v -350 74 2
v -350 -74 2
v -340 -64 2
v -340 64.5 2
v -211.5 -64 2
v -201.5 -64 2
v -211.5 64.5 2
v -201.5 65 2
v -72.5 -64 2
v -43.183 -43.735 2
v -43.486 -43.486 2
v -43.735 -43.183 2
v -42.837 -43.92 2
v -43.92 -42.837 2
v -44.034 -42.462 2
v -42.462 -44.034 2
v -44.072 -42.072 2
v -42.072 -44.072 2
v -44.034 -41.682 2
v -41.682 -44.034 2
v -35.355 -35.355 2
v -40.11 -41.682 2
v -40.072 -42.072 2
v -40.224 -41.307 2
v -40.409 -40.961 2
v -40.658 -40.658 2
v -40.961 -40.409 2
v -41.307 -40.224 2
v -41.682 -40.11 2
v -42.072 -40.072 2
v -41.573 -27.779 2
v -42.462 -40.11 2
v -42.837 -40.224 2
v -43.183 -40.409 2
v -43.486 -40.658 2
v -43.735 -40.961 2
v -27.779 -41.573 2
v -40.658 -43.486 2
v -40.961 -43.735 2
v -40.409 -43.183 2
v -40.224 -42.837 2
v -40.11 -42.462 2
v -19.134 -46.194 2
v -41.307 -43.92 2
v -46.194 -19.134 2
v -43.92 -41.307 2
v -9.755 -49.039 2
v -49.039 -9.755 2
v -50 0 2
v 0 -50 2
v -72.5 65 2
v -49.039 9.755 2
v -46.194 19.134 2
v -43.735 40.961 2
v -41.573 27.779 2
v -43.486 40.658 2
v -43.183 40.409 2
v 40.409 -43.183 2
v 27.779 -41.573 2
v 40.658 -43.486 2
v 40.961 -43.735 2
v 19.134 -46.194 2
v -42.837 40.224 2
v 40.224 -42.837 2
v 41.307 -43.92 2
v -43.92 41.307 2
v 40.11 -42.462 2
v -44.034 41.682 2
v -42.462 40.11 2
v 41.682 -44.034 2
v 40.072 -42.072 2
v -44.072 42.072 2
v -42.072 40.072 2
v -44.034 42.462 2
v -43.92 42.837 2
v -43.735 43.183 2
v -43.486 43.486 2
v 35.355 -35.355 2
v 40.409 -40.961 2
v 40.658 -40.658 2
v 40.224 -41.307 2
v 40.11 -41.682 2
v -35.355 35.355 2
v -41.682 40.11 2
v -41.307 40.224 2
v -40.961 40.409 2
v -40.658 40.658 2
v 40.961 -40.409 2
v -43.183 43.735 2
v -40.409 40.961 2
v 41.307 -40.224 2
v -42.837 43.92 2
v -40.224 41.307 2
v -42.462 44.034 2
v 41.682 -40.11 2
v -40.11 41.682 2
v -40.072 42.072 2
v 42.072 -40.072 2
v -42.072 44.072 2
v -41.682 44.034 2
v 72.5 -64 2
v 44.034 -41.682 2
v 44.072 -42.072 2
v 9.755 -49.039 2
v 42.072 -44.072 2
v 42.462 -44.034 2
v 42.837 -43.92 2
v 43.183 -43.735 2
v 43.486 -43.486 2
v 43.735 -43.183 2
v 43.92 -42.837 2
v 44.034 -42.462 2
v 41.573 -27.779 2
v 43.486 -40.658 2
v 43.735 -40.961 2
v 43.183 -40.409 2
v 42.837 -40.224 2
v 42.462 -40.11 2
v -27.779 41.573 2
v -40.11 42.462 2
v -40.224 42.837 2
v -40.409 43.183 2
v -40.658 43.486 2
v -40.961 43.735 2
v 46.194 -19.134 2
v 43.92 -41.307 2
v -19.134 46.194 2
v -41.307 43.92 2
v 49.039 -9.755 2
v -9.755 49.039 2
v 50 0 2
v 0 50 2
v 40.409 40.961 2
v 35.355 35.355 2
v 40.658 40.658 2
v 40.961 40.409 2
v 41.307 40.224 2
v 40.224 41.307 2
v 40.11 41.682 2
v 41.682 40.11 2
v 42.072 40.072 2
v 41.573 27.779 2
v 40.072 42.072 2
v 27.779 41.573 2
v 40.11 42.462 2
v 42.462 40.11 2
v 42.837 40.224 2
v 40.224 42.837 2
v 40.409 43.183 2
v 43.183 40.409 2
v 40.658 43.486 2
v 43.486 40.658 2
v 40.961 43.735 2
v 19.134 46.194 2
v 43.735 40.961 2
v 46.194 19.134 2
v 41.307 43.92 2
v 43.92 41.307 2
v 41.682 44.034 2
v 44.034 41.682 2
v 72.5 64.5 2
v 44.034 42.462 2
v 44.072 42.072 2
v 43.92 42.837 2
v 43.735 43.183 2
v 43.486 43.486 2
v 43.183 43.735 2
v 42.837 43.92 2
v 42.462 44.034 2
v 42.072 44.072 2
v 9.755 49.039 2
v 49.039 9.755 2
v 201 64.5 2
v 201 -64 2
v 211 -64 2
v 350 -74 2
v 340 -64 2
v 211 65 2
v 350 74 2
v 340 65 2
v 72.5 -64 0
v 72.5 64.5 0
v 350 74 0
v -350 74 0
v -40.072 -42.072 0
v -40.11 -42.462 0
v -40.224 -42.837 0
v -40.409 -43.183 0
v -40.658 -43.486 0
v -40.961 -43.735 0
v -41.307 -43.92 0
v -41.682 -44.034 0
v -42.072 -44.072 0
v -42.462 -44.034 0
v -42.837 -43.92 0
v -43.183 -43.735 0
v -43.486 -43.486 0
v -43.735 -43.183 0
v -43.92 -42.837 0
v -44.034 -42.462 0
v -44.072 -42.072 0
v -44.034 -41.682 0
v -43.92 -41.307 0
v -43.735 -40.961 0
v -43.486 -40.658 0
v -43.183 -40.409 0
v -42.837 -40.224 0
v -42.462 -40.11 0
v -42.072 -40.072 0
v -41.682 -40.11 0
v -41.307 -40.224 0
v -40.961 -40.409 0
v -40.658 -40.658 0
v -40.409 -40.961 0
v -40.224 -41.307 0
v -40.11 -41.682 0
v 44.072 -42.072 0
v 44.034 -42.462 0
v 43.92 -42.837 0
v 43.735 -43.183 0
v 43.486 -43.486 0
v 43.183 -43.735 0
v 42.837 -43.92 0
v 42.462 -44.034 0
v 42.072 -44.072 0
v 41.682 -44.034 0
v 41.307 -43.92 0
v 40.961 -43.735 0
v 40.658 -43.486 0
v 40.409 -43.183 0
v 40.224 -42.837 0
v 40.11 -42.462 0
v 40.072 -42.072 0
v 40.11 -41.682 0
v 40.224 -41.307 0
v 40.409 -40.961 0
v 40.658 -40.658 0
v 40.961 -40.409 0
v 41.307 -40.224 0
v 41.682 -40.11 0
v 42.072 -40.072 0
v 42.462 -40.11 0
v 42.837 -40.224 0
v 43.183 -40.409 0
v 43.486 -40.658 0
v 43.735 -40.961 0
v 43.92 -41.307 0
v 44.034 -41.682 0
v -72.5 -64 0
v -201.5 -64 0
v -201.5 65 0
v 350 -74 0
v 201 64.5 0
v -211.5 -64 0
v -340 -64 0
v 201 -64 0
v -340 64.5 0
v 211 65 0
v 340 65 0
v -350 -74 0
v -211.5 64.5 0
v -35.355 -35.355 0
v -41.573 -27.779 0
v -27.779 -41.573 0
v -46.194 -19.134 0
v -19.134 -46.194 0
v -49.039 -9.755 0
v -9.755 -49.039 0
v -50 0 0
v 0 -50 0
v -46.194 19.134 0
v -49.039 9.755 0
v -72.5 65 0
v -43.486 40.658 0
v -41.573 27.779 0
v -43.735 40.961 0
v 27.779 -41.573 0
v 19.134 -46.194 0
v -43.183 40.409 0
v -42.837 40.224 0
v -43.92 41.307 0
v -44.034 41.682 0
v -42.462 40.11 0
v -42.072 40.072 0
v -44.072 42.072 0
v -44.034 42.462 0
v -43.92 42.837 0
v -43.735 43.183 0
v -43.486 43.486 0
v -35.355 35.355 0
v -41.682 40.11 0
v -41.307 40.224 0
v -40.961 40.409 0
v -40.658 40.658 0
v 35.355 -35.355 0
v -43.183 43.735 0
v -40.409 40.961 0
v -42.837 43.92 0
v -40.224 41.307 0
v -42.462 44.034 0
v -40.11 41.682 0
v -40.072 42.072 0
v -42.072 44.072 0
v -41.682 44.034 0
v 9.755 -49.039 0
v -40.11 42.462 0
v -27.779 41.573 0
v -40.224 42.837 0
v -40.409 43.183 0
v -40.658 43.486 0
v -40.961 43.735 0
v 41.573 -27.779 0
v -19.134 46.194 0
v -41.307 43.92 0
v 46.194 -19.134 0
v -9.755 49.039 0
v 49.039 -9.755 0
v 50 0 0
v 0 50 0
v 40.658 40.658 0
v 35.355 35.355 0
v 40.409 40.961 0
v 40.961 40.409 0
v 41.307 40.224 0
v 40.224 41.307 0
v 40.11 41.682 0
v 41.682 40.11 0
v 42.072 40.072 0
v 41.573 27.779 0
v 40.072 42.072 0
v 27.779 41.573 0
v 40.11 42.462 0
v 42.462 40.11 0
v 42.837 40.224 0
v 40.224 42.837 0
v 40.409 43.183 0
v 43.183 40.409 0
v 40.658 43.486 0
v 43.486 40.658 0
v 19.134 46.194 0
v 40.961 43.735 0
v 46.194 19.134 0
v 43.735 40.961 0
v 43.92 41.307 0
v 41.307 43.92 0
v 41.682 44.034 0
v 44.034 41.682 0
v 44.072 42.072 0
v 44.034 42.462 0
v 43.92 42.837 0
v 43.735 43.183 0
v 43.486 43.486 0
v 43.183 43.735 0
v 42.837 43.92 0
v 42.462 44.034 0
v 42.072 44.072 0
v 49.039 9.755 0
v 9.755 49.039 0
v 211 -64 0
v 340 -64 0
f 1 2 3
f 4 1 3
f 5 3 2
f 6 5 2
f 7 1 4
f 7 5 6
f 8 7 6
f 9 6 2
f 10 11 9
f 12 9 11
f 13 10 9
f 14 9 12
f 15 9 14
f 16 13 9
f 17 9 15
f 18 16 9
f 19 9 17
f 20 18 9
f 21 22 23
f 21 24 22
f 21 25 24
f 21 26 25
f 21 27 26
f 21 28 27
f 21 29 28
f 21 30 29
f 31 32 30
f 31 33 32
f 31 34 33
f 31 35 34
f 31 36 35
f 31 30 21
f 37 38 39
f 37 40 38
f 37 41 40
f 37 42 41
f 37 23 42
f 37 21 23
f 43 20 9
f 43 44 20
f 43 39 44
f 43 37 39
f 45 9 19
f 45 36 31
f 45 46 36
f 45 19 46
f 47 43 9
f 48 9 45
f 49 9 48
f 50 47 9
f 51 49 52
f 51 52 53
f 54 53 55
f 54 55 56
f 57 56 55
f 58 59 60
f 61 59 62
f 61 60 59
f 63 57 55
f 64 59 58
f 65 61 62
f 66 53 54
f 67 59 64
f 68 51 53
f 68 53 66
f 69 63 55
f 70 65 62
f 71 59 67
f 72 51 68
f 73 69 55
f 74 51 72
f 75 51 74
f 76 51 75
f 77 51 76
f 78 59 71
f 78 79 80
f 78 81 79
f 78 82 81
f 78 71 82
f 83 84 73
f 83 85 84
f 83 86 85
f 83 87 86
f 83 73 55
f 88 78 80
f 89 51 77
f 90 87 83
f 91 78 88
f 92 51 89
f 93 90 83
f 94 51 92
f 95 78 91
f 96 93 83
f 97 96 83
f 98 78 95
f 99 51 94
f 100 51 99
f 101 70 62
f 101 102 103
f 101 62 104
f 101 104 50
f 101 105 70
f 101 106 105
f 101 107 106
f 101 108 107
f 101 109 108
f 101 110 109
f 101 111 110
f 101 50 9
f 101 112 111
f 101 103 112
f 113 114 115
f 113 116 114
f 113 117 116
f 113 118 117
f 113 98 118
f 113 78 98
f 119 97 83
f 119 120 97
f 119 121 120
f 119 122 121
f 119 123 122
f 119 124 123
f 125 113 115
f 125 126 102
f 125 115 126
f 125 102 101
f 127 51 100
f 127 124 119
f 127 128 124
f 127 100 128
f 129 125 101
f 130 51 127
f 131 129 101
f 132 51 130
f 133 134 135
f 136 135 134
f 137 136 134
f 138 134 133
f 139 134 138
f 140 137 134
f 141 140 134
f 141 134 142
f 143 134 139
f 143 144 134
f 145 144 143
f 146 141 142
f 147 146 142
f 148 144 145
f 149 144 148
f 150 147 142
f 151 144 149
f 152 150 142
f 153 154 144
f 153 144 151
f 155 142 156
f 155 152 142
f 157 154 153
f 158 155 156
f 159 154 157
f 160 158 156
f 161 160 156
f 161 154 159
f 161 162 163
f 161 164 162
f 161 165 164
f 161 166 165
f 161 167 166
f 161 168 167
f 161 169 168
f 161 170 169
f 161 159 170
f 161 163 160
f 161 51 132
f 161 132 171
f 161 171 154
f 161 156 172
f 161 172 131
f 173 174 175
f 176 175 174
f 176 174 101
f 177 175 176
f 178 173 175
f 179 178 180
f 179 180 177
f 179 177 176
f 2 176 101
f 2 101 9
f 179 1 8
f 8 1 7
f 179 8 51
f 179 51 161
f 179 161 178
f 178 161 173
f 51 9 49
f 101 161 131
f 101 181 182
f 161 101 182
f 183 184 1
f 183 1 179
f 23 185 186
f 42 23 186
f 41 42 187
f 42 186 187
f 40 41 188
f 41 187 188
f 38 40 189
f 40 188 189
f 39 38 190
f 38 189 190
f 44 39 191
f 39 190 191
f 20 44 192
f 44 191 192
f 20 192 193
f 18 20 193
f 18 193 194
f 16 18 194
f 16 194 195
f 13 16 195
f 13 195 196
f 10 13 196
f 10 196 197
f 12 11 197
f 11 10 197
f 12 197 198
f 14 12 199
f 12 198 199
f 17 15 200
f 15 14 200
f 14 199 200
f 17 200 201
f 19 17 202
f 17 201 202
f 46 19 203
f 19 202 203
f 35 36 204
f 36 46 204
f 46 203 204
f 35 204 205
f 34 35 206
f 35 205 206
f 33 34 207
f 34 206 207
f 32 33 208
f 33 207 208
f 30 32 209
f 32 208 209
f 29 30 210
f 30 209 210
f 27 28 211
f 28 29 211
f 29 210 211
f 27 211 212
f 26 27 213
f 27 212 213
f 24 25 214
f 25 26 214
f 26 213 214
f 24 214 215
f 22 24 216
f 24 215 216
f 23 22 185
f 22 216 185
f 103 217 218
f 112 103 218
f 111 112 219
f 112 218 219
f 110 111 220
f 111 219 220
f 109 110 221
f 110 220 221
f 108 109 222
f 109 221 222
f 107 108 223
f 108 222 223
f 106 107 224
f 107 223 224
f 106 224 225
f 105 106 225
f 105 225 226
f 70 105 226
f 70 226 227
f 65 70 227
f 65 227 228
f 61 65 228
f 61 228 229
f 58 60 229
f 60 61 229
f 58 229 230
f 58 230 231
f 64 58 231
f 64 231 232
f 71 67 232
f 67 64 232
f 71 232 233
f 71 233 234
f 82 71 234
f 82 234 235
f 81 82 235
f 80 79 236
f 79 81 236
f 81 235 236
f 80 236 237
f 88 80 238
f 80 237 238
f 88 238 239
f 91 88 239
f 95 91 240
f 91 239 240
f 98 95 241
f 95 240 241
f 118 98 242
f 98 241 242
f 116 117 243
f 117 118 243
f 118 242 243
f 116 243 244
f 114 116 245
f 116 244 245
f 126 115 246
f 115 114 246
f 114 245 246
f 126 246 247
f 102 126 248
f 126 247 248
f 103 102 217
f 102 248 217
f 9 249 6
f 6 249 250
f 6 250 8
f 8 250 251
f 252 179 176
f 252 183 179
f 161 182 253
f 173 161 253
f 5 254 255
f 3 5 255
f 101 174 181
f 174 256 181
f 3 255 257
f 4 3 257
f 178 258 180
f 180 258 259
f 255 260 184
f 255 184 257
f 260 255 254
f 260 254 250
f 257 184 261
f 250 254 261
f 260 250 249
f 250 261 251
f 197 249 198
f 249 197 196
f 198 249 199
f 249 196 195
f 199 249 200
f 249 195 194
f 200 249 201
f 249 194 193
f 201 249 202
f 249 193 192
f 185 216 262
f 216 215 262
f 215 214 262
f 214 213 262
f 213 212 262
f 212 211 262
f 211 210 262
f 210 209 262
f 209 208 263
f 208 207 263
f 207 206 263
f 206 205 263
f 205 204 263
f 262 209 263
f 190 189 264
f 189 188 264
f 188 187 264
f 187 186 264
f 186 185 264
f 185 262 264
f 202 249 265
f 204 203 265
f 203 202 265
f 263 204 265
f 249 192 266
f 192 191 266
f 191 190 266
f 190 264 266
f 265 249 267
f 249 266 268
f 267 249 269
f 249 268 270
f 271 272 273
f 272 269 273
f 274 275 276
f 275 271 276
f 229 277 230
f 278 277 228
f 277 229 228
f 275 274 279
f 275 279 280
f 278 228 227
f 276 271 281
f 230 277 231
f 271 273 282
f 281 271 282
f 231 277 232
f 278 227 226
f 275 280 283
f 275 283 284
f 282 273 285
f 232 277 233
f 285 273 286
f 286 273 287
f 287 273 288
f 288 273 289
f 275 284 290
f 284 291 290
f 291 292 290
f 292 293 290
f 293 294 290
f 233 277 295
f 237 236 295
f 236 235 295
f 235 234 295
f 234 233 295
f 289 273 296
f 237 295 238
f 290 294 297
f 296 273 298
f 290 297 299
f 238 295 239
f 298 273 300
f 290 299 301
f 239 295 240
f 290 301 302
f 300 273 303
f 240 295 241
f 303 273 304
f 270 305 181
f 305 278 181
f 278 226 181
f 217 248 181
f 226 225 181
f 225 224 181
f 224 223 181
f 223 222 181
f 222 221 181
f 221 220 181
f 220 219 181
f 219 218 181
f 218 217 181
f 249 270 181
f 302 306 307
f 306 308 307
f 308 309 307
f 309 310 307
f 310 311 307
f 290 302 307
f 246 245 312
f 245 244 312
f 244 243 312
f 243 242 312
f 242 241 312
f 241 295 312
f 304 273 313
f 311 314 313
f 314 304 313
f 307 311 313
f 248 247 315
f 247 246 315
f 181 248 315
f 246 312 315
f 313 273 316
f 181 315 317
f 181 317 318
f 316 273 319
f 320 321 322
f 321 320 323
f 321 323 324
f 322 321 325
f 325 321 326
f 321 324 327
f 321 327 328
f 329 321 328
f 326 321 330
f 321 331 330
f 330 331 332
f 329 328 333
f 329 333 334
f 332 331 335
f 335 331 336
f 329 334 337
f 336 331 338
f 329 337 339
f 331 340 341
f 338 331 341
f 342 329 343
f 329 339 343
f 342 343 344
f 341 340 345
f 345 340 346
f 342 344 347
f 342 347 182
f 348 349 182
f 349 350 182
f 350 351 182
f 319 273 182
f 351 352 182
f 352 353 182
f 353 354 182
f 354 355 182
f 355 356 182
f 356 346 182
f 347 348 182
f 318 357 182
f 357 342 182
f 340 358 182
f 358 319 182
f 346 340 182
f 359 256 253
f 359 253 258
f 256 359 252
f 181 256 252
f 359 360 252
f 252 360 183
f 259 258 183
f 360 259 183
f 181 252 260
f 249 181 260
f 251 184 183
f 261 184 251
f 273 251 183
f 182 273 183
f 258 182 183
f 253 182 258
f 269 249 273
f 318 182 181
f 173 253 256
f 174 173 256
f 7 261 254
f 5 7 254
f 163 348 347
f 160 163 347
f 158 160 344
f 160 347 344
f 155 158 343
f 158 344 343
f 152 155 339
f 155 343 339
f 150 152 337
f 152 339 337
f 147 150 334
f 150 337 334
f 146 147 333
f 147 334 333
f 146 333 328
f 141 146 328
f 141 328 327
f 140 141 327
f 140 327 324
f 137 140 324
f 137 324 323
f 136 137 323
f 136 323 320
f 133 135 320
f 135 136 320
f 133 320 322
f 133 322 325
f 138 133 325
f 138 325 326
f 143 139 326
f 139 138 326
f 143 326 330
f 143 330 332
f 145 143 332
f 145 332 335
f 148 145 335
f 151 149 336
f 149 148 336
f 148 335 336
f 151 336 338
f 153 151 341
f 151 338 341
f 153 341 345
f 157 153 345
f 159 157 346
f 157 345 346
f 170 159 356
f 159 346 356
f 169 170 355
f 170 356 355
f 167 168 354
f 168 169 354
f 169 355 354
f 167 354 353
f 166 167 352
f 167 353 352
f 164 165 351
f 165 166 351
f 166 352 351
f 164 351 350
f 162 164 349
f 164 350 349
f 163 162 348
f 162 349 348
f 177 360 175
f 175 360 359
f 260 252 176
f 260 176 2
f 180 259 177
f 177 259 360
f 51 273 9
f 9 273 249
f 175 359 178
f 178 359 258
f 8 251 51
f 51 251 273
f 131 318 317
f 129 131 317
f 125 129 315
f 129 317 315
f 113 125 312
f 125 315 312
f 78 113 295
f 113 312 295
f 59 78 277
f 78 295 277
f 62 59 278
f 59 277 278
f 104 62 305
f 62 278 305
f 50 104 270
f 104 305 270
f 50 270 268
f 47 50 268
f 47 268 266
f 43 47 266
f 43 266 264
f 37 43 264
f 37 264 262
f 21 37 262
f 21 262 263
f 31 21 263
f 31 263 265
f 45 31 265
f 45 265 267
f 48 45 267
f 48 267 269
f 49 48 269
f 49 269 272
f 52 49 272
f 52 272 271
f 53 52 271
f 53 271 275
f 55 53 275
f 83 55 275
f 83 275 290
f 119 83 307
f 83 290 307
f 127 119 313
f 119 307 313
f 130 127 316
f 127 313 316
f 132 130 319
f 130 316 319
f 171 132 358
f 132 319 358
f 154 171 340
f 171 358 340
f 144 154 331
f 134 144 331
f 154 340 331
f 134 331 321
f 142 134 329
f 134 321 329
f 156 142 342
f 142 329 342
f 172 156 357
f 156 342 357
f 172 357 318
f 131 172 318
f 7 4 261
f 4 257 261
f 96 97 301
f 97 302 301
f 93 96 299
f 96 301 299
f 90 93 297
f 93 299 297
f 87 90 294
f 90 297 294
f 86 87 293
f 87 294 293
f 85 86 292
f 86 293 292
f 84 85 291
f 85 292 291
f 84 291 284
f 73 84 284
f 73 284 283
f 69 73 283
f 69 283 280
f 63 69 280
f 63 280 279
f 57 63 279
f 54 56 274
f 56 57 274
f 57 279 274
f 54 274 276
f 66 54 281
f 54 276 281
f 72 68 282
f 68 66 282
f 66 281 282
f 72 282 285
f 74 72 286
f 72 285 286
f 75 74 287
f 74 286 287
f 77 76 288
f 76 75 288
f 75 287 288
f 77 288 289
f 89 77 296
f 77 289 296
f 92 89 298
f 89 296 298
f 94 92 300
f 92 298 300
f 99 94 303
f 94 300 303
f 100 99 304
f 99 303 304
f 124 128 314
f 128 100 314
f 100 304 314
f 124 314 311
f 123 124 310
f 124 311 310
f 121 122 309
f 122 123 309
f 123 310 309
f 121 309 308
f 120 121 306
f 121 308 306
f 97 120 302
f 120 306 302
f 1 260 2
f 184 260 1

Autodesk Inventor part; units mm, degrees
ref_plane "YZ Plane" through (0, 0, 0) normal (1, 0, 0) x (0, 1, 0)
ref_plane "XZ Plane" through (0, 0, 0) normal (0, 1, 0) x (-1, 0, 0)
ref_plane "XY Plane" through (0, 0, 0) normal (0, 0, 1) x (1, 0, 0)
sketch "스케치1" plane through (0, 0, 0) normal (0, 0, 1) x (1, 0, 0)
  line L0 (-350, 74) -> (350, 74)
  line L1 (350, 74) -> (350, -74)
  line L2 (350, -74) -> (-350, -74)
  line L3 (-350, -74) -> (-350, 74)
  line L4 (-340, 64.5) -> (-211.5, 64.5)
  line L5 (-211.5, 64.5) -> (-211.5, -64)
  line L6 (-211.5, -64) -> (-340, -64)
  line L7 (-340, -64) -> (-340, 64.5)
  line L8 (-201.5, 65) -> (-72.5, 65)
  line L9 (-72.5, 65) -> (-72.5, -64)
  line L10 (-72.5, -64) -> (-201.5, -64)
  line L11 (-201.5, -64) -> (-201.5, 65)
  line L12 (211, 65) -> (340, 65)
  line L13 (340, 65) -> (340, -64)
  line L14 (340, -64) -> (211, -64)
  line L15 (211, -64) -> (211, 65)
  line L16 (72.5, 64.5) -> (201, 64.5)
  line L17 (201, 64.5) -> (201, -64)
  line L18 (201, -64) -> (72.5, -64)
  line L19 (72.5, -64) -> (72.5, 64.5)
  circle A0 centre (0, 0) radius 50
  circle A1 centre (42.072, 42.072) radius 2
  circle A2 centre (-42.072, 42.072) radius 2
  circle A3 centre (-42.072, -42.072) radius 2
  circle A4 centre (42.072, -42.072) radius 2
  line L20 (-490, 0) -> (490, 0) projected
  line L21 (0, -103.6) -> (0, 103.6) projected
  point P0 (0, -74)
  point P1 (-72.5, 0.5)
  point P2 (-201.5, 0.5)
  point P3 (-137, -64)
  point P4 (-137, 65)
  point P5 (340, 0.5)
  point P6 (211, 0.5)
  point P7 (275.5, -64)
  point P8 (275.5, 65)
  point P9 (136.75, -64)
  point P10 (136.75, 64.5)
  point P11 (201, 0.25)
  point P12 (72.5, 0.25)
  dimension "d0" = 148
  dimension "d1" = 74
  dimension "d2" = 700
  dimension "d3" = 350
  dimension "d4" = 128.5
  dimension "d5" = 128.5
  dimension "d6" = 10
  dimension "d7" = 10
  dimension "d8" = 129
  dimension "d9" = 129
  dimension "d10" = 10
  dimension "d11" = 10
  dimension "d12" = 129
  dimension "d13" = 129
  dimension "d14" = 128.5
  dimension "d15" = 128.5
  dimension "d16" = 10
  dimension "d17" = 10
  dimension "d18" = 10
  dimension "d19" = 10
  dimension "d20" = 100
  dimension "d21" = 4
  dimension "d22" = 4
  dimension "d23" = 4
  dimension "d24" = 4
  dimension "d25" = 42.072
  dimension "d26" = 42.072
  dimension "d27" = 42.072
  dimension "d28" = 42.072
  dimension "d29" = 42.072
  dimension "d30" = 42.072
  dimension "d31" = 42.072
  dimension "d32" = 42.072
extrude "돌출3" add sketch "스케치1" along normal blind 2 contours L0 L21 A0 L20 L9 L8 L11 L5 L4 L7 L3 | L0 L1 L20 L13 L12 L15 L17 L16 L19 A0 L21 | L20 L7 L6 L5 L11 L10 L9 A0 L21 L2 L3 | L1 L2 L21 A0 L20 L19 L18 L17 L15 L14 L13
equation "\"d1\" = 0.5 * d0"
equation "\"d3\" = 0.5 * d2"
properties part number "가로로만"
